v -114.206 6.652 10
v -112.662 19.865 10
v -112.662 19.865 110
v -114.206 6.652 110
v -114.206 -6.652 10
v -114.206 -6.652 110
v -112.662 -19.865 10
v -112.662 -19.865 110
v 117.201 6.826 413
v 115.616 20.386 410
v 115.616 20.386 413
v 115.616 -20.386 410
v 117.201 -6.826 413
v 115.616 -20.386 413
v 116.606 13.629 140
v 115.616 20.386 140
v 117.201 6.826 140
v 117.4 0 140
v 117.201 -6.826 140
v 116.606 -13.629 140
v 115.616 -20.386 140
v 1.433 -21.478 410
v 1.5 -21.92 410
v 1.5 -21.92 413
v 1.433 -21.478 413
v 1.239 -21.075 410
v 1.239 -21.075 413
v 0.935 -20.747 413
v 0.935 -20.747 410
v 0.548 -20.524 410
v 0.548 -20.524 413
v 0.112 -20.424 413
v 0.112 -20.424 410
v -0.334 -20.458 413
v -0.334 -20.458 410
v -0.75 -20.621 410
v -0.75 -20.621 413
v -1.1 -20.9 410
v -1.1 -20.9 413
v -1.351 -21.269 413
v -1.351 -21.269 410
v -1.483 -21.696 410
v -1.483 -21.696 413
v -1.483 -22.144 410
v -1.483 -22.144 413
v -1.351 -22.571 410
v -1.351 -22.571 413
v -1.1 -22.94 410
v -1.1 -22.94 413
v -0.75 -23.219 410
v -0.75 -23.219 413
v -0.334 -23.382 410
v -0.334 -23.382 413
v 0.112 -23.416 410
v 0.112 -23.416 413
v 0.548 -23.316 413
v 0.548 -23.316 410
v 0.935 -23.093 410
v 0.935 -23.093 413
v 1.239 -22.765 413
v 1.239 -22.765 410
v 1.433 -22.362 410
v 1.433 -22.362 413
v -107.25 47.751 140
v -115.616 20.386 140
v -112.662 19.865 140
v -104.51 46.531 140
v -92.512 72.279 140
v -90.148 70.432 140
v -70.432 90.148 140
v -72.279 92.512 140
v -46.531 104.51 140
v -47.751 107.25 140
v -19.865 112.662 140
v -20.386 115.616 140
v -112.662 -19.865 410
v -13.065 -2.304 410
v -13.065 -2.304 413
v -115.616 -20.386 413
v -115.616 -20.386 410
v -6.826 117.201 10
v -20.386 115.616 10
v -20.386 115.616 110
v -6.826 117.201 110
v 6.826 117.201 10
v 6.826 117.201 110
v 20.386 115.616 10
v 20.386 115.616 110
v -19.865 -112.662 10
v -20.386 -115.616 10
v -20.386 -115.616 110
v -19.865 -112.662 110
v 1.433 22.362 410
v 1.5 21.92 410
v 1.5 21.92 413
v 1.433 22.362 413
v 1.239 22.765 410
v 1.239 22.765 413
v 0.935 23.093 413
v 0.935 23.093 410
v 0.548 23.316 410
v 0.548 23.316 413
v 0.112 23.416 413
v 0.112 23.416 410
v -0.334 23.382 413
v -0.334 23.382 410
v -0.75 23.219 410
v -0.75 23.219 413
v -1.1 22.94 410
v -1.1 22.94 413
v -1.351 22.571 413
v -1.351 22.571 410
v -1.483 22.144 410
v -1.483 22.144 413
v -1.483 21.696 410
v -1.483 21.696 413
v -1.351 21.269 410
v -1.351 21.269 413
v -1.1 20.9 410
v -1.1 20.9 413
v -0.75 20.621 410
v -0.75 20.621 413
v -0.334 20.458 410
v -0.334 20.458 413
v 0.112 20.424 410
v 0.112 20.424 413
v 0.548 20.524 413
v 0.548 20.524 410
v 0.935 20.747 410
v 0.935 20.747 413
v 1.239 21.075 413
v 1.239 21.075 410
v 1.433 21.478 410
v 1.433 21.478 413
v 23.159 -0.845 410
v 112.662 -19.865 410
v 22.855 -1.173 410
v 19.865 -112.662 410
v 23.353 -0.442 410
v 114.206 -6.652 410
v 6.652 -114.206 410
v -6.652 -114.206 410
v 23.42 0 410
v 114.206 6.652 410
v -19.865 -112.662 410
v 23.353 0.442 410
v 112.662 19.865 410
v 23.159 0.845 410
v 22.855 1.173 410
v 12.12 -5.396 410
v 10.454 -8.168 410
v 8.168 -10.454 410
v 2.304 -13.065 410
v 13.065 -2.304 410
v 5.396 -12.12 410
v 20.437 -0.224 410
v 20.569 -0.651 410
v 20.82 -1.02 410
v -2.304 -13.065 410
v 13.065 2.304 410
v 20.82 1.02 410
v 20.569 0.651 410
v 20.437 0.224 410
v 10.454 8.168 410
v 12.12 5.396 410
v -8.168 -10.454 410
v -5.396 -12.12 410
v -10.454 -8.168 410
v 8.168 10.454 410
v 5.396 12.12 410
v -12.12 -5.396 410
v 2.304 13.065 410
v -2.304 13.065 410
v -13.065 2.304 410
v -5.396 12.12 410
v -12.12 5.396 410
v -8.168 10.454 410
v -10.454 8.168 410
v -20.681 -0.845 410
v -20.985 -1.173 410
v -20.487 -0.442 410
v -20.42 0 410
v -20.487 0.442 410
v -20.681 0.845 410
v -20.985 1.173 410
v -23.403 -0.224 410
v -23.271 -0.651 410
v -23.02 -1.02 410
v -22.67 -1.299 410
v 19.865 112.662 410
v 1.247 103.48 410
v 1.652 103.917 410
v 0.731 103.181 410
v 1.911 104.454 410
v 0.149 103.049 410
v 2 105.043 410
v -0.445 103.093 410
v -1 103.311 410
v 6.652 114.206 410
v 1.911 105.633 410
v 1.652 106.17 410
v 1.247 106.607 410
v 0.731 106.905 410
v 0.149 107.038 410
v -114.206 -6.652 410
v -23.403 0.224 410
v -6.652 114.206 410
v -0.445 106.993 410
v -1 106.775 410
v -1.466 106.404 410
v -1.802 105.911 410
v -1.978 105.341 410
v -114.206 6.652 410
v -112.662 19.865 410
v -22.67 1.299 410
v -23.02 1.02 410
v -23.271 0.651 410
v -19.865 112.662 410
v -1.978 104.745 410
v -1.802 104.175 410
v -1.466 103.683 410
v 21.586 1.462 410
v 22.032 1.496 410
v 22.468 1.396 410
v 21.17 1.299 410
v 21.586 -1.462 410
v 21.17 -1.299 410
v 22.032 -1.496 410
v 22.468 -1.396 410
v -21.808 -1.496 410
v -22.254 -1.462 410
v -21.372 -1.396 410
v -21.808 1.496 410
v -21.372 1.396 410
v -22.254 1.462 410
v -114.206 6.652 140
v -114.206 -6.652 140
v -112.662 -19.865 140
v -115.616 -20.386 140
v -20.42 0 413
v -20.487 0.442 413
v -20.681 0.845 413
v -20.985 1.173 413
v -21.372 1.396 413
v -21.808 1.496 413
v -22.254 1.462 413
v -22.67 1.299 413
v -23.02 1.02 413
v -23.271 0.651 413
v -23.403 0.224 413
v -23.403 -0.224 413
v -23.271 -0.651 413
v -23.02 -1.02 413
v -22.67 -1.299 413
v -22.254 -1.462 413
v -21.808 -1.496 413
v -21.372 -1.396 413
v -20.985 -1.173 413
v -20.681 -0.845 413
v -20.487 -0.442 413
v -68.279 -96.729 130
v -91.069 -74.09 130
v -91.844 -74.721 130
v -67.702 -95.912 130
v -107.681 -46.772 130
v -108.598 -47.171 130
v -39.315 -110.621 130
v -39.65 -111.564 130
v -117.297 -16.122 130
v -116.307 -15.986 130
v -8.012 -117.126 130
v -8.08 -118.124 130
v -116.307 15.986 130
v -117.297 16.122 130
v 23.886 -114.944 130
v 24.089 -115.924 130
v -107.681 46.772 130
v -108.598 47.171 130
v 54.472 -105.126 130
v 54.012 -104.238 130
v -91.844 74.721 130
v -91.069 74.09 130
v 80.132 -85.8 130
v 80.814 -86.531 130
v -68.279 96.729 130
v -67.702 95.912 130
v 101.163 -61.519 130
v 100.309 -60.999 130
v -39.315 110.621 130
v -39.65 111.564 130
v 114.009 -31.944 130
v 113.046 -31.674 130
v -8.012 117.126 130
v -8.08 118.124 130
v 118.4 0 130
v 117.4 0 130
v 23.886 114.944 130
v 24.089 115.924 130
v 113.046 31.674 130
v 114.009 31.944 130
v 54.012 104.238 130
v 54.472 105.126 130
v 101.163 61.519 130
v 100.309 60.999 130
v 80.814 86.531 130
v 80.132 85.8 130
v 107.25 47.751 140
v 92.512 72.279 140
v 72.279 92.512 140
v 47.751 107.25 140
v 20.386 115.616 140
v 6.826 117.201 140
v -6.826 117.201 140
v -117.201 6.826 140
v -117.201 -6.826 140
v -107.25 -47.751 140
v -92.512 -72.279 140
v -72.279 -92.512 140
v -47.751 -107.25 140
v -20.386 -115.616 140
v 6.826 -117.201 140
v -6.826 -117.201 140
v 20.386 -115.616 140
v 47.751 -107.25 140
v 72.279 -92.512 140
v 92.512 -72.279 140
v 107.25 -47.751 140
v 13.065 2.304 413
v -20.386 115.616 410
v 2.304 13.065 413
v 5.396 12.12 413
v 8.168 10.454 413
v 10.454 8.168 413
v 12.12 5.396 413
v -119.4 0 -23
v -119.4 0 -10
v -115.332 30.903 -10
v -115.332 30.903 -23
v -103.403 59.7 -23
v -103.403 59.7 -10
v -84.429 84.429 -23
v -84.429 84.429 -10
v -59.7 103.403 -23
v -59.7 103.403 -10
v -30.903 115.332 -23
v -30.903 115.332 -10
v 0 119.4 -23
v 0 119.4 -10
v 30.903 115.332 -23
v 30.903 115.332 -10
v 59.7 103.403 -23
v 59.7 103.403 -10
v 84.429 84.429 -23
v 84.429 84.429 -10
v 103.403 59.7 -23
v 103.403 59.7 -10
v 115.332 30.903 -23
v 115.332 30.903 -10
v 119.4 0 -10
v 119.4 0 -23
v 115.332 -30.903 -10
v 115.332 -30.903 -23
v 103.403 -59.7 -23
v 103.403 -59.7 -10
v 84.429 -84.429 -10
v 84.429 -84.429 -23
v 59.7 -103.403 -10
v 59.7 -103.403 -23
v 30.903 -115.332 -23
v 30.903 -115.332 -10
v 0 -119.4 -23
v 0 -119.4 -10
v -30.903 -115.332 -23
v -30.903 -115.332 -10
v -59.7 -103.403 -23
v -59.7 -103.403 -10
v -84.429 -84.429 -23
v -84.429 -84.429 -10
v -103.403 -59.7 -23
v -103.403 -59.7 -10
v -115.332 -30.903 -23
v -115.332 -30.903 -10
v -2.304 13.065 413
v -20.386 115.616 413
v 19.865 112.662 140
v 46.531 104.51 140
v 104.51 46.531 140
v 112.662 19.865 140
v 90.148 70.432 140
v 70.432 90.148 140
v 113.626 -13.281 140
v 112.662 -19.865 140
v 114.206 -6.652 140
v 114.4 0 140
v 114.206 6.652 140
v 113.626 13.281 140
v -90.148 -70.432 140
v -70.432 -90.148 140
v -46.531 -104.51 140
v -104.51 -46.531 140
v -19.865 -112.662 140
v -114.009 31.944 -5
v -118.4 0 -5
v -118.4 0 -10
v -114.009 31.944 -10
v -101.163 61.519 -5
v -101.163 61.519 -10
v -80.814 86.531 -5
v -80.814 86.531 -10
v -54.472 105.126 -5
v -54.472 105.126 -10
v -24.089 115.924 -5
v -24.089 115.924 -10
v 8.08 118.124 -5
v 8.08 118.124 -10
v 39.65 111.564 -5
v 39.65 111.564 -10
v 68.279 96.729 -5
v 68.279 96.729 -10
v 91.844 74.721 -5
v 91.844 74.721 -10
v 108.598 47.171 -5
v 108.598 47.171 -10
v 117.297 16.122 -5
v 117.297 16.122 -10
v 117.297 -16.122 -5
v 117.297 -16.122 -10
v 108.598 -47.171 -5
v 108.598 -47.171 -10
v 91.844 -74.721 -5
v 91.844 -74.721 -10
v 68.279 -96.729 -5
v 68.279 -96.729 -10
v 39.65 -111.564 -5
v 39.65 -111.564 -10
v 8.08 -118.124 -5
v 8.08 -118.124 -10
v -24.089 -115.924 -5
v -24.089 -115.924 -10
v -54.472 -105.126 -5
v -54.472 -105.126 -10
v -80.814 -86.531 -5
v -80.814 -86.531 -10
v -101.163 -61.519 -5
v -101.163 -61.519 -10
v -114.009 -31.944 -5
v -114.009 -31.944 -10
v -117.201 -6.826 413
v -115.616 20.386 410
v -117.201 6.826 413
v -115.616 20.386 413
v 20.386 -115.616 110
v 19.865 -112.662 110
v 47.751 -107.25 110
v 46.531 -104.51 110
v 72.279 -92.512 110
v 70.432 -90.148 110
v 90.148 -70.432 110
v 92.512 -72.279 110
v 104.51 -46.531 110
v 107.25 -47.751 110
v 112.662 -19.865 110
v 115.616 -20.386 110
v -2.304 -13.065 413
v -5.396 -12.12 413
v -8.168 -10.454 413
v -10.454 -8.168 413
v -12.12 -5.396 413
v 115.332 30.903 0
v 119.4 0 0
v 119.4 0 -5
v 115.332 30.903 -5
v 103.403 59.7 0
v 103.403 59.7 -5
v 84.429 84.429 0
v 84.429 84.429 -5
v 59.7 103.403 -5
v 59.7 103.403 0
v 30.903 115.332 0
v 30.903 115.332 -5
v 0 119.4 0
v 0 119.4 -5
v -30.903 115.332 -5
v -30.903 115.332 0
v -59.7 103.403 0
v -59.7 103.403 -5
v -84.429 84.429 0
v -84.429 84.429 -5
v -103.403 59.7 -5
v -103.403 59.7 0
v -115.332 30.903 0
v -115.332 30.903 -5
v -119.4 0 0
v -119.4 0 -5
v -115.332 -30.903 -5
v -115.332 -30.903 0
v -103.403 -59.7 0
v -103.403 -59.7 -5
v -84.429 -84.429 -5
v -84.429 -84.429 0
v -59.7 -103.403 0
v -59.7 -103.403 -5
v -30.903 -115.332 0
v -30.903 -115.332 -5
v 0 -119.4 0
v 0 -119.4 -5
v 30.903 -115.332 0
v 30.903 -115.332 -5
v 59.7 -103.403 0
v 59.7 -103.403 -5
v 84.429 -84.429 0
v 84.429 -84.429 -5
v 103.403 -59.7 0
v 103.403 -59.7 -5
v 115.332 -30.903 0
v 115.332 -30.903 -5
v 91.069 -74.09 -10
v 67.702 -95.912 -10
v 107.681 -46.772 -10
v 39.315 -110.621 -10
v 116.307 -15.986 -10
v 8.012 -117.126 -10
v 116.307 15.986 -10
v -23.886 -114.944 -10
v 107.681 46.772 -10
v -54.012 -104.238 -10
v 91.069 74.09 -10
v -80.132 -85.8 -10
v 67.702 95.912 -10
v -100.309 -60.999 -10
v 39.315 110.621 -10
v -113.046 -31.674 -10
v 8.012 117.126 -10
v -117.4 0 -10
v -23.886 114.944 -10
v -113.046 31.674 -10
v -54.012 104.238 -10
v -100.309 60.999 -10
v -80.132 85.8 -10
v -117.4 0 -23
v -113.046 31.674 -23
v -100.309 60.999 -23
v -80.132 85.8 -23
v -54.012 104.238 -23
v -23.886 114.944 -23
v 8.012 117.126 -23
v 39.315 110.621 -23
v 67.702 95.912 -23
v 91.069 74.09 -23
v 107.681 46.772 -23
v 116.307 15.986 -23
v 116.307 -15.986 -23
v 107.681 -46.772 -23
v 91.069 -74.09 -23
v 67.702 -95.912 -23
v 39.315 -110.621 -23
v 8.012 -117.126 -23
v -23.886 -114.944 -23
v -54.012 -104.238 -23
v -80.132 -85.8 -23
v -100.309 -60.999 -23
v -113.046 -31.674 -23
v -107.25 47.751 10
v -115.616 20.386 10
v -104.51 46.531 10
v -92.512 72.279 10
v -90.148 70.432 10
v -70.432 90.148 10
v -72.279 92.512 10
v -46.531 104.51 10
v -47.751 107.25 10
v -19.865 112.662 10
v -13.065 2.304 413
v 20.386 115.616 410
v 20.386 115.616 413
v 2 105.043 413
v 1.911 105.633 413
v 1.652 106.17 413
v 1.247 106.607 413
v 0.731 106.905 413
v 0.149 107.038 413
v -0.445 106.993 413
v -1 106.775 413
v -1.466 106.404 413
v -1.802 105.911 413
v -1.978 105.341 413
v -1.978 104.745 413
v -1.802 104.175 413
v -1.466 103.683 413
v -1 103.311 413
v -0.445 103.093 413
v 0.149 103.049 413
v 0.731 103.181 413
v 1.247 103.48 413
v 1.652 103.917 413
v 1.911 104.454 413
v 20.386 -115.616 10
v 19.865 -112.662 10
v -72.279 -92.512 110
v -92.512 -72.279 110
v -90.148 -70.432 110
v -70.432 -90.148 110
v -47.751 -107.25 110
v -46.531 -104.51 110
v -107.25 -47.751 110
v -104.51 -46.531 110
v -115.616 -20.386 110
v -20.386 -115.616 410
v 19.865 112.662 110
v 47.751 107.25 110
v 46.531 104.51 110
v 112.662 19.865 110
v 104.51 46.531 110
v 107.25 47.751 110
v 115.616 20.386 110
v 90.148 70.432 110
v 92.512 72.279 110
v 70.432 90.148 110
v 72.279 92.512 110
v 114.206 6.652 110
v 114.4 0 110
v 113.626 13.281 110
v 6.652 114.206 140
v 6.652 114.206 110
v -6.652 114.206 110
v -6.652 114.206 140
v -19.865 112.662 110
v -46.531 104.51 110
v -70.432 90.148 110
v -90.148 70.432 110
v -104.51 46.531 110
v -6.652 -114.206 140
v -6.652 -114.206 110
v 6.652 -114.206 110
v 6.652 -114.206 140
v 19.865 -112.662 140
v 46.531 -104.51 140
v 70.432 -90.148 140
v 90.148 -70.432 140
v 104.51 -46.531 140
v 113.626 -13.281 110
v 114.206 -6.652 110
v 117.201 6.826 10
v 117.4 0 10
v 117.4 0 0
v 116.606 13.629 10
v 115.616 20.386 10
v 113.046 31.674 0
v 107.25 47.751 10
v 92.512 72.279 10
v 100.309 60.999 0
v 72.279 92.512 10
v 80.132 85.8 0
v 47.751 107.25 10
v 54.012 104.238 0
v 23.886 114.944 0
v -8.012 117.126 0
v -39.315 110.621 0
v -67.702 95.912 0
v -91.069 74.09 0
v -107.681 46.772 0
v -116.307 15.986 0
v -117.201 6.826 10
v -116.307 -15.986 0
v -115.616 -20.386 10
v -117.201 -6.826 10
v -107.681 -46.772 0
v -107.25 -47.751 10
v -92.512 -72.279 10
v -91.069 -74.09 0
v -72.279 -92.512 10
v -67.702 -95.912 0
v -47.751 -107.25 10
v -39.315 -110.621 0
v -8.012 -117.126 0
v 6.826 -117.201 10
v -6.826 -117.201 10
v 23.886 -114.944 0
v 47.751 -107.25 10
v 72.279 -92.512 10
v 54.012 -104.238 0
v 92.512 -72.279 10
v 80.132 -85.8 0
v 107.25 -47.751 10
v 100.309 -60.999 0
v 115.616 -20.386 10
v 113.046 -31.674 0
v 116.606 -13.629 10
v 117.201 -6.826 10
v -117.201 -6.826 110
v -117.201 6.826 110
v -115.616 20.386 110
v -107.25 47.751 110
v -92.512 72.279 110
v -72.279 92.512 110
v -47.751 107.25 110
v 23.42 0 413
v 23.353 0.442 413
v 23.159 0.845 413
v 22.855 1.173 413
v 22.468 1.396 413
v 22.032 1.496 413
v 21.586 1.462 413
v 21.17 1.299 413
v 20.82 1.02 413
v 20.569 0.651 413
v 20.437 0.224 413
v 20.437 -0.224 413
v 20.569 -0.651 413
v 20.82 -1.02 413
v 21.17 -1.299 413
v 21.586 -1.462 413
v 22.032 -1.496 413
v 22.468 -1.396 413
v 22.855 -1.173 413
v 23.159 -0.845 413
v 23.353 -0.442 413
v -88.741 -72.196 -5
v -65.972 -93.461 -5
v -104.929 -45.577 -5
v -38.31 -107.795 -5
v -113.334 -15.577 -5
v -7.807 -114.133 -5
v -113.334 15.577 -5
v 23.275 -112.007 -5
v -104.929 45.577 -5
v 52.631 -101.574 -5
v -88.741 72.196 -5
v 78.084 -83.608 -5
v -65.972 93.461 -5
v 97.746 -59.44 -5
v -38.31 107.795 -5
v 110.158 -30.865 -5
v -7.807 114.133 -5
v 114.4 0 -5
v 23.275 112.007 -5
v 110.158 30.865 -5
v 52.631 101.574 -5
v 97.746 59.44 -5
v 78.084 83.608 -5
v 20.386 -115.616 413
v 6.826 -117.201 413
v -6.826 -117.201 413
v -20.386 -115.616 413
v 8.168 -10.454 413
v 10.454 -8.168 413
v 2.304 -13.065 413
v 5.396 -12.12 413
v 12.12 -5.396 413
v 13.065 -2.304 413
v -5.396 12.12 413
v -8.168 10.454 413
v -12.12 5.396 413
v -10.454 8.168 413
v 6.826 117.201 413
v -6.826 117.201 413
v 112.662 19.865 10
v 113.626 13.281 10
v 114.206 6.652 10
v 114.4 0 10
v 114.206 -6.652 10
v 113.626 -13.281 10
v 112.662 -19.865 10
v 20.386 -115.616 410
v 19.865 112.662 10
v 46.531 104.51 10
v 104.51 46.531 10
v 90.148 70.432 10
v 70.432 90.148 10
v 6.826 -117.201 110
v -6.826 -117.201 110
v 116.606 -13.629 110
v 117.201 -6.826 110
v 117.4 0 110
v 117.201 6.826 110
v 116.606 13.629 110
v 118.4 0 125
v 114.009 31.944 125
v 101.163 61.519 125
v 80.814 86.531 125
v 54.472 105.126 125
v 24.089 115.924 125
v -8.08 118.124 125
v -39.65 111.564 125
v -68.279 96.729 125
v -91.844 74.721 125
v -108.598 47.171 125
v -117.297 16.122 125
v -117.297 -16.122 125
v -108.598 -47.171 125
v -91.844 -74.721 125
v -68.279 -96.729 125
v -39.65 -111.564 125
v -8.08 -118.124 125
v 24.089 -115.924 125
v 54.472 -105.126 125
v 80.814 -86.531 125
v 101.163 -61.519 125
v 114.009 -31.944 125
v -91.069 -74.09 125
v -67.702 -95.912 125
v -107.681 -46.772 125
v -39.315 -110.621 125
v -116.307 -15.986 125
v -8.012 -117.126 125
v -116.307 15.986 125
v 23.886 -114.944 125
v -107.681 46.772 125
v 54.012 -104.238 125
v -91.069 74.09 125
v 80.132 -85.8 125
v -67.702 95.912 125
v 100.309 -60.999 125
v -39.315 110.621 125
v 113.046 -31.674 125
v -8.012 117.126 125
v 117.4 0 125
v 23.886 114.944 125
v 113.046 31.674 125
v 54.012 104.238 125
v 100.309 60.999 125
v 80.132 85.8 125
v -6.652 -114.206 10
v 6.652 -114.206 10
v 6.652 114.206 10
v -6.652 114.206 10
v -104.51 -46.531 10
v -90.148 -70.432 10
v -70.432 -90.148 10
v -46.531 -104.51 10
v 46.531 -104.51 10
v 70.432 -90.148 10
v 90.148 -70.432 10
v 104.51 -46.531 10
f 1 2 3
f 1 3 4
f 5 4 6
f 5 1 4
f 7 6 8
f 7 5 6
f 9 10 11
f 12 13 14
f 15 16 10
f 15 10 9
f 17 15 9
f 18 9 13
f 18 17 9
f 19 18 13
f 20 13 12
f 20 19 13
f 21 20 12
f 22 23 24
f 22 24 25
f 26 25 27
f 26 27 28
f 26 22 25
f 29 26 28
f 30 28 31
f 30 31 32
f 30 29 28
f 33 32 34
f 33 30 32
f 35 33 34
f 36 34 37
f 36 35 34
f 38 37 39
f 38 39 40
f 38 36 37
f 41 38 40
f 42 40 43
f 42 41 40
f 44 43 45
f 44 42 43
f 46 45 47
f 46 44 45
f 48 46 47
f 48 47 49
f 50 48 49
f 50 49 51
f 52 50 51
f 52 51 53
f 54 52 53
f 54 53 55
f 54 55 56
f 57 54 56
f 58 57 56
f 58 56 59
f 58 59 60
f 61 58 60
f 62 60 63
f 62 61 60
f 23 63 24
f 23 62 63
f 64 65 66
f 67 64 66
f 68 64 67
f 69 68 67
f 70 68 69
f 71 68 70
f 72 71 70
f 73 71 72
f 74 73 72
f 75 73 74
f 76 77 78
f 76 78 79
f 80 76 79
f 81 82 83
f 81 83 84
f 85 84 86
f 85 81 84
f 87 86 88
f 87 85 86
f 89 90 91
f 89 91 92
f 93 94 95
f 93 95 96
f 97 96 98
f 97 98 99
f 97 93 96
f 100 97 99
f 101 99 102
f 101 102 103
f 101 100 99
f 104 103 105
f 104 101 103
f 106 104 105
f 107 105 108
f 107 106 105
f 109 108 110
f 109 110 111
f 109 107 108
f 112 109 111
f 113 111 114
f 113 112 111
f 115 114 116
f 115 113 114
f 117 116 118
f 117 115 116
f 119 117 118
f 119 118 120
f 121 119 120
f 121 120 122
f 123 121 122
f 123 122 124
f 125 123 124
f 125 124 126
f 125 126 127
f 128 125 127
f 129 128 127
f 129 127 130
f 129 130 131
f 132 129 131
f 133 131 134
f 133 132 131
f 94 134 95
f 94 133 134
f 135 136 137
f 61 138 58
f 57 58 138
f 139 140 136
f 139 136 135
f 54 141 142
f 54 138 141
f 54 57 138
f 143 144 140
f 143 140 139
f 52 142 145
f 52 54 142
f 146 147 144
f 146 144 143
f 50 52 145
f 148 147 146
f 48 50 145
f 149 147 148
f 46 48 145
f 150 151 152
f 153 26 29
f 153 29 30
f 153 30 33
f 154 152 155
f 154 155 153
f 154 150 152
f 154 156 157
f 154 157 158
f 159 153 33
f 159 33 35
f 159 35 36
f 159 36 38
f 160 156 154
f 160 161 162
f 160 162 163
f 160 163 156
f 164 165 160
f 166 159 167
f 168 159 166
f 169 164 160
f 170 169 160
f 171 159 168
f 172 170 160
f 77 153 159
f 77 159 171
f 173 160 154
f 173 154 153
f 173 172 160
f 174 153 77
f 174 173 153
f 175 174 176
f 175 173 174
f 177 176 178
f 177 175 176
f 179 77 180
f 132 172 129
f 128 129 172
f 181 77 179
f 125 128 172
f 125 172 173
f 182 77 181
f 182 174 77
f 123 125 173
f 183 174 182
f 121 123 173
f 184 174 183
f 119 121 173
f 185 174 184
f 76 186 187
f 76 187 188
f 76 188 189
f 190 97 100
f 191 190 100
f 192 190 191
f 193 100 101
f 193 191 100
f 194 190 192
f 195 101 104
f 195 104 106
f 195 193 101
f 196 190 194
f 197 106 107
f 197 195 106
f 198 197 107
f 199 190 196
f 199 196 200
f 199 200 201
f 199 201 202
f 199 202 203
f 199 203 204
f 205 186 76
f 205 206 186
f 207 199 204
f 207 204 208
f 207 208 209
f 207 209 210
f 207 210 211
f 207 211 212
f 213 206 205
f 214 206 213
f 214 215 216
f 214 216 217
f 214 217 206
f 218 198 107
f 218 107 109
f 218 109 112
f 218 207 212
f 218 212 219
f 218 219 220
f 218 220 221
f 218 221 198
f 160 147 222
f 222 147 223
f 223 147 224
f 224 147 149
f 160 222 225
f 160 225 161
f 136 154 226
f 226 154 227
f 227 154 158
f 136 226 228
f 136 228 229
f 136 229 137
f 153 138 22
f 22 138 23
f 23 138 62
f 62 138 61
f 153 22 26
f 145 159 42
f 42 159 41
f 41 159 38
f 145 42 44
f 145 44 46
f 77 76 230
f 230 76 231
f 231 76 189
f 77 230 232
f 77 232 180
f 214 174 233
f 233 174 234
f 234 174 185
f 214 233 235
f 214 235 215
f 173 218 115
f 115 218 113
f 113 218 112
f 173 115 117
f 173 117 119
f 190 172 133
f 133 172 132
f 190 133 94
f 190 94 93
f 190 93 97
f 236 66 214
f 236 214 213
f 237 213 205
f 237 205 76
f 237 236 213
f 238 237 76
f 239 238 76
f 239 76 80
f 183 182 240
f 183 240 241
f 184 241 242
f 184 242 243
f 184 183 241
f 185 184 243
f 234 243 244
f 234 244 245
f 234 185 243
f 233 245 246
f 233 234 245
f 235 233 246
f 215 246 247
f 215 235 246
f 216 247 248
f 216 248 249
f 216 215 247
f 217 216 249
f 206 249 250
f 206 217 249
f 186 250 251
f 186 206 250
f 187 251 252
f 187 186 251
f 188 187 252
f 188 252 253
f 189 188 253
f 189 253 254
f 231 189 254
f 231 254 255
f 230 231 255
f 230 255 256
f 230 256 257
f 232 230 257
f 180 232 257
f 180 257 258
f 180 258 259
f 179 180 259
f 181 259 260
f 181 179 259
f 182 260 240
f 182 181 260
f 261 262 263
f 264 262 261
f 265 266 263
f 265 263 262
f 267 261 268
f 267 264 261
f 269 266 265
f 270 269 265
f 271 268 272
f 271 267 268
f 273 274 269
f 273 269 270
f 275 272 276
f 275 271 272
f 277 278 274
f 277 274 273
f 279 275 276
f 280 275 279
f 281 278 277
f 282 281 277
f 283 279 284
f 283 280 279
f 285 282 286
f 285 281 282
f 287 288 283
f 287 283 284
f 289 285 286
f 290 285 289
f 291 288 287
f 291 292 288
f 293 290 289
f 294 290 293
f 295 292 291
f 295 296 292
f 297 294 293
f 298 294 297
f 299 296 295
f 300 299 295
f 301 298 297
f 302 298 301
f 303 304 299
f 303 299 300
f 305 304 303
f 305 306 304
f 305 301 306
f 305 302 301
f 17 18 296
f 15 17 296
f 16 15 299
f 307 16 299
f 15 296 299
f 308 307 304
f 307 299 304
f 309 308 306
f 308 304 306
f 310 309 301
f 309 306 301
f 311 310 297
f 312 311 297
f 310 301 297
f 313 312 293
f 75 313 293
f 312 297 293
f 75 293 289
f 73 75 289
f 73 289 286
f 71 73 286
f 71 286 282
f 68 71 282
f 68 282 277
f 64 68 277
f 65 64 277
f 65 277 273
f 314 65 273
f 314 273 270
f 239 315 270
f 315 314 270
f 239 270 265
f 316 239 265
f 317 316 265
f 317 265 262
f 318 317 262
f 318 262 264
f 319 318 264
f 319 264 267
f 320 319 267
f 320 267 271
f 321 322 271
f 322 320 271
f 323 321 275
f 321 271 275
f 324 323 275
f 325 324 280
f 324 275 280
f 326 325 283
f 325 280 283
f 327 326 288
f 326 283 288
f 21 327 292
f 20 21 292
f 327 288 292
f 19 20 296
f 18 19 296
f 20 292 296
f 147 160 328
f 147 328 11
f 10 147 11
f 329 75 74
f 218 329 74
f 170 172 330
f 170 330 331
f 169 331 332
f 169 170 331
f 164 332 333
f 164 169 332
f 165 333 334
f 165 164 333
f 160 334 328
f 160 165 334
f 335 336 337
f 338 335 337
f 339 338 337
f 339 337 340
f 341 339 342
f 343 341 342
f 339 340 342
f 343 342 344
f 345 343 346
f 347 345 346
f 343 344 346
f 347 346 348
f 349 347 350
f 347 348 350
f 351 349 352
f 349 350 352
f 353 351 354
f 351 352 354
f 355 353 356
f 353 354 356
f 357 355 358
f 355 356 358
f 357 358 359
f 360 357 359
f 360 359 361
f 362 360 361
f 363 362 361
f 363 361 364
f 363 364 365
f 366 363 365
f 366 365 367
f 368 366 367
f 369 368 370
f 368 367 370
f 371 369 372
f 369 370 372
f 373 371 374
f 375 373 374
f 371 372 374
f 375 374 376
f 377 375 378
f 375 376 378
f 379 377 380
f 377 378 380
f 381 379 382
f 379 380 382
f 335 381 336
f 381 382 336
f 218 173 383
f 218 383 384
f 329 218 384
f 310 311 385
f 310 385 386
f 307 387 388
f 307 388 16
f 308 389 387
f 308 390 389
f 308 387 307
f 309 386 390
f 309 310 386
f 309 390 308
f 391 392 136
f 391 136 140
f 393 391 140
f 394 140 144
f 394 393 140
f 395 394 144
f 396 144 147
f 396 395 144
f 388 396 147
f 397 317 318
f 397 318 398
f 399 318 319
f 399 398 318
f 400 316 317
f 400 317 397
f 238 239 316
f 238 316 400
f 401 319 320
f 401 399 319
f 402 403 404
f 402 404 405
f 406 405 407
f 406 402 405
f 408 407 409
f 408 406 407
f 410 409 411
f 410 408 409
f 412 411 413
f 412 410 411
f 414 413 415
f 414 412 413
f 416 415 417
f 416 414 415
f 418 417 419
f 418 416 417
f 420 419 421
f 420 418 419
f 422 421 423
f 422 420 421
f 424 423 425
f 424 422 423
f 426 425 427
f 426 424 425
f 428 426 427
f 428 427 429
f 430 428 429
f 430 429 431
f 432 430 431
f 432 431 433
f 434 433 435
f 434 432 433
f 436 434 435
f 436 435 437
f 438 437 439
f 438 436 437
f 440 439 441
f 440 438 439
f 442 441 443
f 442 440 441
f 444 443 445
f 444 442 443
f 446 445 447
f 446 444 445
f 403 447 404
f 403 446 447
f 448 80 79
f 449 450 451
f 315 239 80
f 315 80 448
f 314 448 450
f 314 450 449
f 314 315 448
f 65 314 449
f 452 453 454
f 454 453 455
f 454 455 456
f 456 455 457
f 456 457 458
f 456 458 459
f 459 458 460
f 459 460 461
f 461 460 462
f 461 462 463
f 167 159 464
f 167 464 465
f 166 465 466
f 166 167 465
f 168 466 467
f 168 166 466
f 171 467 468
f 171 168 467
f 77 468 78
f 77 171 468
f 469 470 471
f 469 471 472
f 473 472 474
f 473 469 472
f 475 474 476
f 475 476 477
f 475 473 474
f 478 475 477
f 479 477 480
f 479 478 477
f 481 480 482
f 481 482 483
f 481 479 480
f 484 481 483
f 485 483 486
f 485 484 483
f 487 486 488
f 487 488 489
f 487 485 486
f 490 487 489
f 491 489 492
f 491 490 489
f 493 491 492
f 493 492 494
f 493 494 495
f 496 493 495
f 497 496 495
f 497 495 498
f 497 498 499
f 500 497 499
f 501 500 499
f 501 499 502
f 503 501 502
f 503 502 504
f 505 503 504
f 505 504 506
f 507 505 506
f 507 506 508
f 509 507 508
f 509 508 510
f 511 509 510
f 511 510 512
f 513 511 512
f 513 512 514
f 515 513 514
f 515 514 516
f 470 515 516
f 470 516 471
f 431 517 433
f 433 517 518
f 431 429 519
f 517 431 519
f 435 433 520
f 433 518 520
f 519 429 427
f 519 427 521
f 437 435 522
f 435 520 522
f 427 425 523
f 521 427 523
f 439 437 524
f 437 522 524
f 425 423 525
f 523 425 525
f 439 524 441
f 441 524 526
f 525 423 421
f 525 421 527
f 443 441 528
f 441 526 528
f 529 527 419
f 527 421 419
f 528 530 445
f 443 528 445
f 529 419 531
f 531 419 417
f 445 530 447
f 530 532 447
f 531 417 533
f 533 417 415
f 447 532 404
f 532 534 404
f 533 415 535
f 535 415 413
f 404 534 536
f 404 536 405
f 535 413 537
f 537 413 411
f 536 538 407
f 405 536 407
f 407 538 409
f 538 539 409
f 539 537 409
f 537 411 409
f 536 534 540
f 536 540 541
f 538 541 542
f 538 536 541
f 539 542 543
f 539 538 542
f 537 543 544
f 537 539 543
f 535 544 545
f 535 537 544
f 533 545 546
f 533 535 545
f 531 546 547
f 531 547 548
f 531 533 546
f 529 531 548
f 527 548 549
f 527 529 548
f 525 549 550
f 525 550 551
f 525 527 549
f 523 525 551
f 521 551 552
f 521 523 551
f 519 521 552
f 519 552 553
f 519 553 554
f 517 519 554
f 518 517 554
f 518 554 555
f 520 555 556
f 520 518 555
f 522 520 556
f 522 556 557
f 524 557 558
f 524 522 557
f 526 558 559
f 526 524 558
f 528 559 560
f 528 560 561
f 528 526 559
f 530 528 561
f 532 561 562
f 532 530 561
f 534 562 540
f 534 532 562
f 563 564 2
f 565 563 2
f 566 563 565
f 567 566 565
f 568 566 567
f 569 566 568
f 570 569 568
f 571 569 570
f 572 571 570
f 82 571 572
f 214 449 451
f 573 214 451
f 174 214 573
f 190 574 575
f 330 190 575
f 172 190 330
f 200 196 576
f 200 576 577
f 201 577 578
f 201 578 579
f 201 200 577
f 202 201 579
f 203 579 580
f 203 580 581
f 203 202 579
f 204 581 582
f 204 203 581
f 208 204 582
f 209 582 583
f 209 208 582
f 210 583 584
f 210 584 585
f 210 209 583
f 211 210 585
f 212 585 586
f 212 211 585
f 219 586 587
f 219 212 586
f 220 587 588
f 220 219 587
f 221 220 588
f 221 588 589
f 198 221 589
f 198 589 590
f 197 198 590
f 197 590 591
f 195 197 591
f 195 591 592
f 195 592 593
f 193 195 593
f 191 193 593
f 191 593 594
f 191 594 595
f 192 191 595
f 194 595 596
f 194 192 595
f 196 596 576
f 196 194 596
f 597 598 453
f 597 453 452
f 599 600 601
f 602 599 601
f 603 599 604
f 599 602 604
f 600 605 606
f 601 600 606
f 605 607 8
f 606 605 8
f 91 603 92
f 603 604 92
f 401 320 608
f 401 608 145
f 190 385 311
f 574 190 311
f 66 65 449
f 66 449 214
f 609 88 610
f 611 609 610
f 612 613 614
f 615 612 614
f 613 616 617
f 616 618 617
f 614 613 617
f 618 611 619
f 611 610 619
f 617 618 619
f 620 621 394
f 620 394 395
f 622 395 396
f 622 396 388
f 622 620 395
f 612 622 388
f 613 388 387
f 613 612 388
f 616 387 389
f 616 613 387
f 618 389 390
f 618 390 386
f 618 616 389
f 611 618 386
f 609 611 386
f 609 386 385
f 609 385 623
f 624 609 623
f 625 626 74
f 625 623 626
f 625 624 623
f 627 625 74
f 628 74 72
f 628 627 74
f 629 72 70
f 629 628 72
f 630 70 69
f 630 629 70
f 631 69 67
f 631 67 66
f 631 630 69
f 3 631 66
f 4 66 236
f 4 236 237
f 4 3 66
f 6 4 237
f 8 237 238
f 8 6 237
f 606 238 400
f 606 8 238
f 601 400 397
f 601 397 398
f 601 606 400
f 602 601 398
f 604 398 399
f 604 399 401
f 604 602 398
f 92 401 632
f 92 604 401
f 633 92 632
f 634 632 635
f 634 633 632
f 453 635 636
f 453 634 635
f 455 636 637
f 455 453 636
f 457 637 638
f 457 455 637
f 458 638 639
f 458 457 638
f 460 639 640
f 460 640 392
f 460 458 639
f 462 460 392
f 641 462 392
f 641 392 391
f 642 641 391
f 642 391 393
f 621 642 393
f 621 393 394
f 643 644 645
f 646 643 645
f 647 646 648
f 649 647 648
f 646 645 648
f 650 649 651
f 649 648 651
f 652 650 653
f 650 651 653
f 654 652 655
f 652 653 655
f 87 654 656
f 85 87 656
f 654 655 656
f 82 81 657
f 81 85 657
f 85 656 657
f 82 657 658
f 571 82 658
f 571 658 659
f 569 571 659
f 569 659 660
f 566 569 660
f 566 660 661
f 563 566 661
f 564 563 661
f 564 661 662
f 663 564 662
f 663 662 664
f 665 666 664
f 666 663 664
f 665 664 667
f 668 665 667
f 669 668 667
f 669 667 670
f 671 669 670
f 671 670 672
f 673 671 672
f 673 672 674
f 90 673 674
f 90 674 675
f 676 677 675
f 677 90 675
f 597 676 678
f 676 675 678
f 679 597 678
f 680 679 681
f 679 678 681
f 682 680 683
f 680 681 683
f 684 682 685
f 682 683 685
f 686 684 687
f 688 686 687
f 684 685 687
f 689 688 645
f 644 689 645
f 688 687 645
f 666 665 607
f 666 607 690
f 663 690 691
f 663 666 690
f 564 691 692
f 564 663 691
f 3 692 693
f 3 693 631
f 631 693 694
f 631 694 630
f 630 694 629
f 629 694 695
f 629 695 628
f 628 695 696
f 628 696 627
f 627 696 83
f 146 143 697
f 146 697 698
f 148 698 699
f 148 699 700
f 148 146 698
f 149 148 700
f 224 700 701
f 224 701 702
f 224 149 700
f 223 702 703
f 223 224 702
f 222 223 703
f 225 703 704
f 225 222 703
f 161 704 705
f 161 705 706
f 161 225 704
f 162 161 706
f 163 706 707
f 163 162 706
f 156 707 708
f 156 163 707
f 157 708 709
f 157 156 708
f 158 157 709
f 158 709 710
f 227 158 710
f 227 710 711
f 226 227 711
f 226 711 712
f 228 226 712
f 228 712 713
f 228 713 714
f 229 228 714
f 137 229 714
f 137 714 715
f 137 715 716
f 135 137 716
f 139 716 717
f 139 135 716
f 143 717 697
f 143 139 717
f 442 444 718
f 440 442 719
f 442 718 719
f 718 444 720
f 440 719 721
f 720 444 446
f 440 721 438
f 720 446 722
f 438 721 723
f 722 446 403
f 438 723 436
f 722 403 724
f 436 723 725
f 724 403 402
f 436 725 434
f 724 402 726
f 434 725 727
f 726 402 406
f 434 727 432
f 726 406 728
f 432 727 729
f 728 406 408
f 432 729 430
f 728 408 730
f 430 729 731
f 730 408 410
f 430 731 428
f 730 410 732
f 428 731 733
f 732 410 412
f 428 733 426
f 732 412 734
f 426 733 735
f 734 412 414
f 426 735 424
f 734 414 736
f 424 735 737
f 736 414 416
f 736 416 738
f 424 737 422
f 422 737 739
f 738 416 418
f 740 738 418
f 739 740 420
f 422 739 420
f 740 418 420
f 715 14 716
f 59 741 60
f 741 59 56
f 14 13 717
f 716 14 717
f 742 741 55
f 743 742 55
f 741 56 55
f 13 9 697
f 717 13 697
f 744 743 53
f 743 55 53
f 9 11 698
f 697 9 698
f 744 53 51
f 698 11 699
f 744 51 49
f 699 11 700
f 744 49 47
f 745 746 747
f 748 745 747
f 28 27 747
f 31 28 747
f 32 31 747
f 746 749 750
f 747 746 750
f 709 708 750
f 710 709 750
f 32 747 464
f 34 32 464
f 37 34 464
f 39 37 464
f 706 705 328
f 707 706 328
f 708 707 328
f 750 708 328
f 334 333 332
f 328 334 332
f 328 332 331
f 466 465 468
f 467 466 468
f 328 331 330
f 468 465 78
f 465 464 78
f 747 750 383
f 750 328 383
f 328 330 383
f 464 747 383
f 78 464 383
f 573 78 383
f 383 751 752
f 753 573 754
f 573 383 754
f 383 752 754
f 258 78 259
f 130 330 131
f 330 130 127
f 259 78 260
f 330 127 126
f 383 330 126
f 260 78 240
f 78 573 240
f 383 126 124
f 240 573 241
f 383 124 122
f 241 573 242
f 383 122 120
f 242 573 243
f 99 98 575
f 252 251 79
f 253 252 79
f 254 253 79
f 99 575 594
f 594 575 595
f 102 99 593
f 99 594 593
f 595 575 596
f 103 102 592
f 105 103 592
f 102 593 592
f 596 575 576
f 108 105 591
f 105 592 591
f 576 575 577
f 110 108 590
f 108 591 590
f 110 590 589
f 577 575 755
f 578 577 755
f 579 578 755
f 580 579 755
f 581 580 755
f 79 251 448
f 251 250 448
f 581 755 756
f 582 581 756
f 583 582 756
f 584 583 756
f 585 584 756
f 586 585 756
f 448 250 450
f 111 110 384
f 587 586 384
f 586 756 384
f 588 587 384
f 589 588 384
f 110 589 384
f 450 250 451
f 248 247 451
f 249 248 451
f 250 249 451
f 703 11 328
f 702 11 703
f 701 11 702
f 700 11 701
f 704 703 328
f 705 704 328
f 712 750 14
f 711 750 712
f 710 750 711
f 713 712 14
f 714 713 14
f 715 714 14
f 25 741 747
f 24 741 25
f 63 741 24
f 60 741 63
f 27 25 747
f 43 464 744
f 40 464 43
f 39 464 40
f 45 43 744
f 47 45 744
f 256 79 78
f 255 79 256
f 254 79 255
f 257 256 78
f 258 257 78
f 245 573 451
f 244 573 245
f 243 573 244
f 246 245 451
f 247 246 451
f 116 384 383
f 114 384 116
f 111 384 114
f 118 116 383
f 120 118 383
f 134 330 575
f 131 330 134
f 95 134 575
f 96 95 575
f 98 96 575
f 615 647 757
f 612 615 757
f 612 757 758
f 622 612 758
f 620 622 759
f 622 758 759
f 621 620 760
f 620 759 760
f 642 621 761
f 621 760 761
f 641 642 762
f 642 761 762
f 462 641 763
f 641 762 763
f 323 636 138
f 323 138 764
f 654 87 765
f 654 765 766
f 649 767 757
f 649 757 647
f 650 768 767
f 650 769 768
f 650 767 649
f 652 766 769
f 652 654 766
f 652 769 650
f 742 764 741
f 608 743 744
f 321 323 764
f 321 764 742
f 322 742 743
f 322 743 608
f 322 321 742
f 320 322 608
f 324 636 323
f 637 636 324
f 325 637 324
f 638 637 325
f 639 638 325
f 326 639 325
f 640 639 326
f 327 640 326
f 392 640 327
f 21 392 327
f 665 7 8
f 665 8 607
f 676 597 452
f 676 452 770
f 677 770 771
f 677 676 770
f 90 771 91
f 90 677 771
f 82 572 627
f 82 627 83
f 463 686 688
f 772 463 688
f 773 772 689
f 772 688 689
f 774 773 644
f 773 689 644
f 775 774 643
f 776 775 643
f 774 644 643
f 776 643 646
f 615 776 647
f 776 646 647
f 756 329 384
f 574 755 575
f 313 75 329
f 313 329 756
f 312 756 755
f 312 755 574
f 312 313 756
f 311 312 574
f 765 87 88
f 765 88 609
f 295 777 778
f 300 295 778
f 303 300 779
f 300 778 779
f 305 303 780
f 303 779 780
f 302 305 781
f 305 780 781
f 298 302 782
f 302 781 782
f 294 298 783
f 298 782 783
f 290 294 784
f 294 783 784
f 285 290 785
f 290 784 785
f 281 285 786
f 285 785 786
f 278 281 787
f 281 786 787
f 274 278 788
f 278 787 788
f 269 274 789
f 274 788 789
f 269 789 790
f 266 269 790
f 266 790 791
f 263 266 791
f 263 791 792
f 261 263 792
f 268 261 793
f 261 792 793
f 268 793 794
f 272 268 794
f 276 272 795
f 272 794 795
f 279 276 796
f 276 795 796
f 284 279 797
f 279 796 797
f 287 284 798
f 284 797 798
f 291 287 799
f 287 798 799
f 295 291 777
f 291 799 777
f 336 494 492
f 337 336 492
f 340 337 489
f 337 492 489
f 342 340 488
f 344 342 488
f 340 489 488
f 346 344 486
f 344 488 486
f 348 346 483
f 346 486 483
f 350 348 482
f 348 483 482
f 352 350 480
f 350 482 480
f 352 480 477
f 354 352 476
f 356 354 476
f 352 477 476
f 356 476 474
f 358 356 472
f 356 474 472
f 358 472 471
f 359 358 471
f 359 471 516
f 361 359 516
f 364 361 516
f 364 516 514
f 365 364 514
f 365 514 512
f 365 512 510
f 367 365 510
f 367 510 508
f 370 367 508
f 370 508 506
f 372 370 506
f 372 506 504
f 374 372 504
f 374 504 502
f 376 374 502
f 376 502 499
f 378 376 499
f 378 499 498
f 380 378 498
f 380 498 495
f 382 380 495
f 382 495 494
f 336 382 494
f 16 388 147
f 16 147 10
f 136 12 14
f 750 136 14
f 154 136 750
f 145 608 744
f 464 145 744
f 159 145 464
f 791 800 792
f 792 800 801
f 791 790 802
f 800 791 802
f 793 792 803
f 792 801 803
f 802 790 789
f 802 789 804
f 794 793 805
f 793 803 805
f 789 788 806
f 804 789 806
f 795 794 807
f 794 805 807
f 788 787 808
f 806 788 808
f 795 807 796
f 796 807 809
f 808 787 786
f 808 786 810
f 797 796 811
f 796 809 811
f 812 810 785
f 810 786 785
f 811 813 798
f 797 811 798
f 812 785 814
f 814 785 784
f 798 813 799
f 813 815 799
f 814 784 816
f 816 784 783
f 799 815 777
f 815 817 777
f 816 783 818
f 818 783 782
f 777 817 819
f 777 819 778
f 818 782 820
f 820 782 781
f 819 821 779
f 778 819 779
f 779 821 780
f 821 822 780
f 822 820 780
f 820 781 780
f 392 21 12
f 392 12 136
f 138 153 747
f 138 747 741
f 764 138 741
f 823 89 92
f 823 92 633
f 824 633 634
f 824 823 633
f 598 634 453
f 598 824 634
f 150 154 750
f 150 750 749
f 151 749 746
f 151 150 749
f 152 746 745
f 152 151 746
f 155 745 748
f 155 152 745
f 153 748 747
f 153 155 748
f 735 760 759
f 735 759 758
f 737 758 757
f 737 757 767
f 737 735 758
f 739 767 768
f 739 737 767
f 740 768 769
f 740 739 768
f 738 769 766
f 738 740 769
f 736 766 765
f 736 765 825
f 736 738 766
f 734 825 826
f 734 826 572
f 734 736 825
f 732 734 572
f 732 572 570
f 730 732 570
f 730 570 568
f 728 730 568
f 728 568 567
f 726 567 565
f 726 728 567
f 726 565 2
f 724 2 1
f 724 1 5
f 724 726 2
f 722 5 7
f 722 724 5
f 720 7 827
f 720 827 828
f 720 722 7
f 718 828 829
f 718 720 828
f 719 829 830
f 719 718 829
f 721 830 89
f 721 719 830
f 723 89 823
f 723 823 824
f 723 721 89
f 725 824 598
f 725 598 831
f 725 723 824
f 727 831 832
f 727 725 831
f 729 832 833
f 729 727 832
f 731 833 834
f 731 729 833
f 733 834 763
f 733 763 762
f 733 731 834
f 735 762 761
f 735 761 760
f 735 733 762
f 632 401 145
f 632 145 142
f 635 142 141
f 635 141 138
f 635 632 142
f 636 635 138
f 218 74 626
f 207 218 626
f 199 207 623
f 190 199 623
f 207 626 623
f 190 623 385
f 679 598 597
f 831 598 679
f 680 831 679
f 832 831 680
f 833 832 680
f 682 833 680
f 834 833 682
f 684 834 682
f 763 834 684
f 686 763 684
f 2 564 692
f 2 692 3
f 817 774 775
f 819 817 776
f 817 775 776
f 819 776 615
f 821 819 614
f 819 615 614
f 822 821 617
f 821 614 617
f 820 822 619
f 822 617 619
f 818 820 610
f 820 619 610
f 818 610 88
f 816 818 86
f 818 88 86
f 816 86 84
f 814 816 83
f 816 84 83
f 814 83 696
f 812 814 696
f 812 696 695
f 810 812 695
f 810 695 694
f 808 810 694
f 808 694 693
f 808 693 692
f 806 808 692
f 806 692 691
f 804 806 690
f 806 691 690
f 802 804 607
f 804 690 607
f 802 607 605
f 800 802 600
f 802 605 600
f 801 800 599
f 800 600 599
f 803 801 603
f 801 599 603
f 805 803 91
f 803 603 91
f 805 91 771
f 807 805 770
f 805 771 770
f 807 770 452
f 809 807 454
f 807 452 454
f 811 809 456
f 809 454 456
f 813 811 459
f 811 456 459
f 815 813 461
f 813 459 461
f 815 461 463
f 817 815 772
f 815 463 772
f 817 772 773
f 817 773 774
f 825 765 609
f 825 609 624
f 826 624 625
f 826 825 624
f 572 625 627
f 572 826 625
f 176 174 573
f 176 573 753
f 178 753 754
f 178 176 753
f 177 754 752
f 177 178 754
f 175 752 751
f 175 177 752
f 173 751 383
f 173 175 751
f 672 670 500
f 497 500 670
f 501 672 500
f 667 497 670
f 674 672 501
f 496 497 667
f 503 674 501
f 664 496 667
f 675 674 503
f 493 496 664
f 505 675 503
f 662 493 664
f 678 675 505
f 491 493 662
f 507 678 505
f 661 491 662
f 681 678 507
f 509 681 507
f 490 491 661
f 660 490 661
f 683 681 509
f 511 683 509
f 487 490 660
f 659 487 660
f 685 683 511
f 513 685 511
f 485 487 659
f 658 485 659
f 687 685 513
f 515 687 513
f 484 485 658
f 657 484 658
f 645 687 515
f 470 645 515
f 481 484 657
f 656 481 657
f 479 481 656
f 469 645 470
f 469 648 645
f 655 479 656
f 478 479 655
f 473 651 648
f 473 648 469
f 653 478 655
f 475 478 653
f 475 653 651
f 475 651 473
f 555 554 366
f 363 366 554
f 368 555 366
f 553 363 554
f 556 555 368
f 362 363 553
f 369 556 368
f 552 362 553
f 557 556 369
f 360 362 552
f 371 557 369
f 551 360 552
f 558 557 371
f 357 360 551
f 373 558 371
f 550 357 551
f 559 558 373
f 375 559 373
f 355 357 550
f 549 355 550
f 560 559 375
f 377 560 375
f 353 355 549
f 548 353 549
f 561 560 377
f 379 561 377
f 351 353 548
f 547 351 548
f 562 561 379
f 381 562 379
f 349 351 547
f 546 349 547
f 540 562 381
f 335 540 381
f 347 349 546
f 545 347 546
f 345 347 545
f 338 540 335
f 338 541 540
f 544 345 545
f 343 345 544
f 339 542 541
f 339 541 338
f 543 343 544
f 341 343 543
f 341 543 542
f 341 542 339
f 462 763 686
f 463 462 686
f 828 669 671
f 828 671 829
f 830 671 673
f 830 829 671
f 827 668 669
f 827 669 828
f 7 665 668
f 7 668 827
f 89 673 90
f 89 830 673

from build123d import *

# Parameters (mm, degrees)
SKETCH1_R       = 119.4
SKETCH1_R_2     = 114.4
EXTRUDE1_DEPTH  = 5
SKETCH2_R       = 119.4
SKETCH2_R_2     = 118.4
EXTRUDE2_DEPTH  = 5
SKETCH3_R       = 119.4
SKETCH3_R_2     = 117.4
EXTRUDE3_DEPTH  = 13
SKETCH4_R       = 117.4
SKETCH4_R_2     = 114.4
EXTRUDE4_DEPTH  = 10
EXTRUDE5_DEPTH  = 100
SKETCH6_R       = 117.4
SKETCH6_R_2     = 114.4
EXTRUDE7_DEPTH  = 15
SKETCH7_R       = 118.4
SKETCH7_R_2     = 114.4
EXTRUDE8_DEPTH  = 5
SKETCH8_R       = 117.4
SKETCH8_R_2     = 114.4
EXTRUDE9_DEPTH  = 10
EXTRUDE10_DEPTH = 270
SKETCH10_R      = 1.5
SKETCH10_R_2    = 2
EXTRUDE11_DEPTH = 3


with BuildPart() as part:
    # Sketch1 → Extrude1 (new body)
    with BuildSketch(Plane.XY):
        Circle(SKETCH1_R)
        Circle(SKETCH1_R_2, mode=Mode.SUBTRACT)
    extrude(amount=-EXTRUDE1_DEPTH)

    # Sketch2 → Extrude2 (add)
    with BuildSketch(Plane(origin=(0, 0, -5), x_dir=(-1, 0, 0), z_dir=(0, 0, -1))):
        Circle(SKETCH2_R)
        Circle(SKETCH2_R_2, mode=Mode.SUBTRACT)
    extrude(amount=EXTRUDE2_DEPTH)

    # Sketch3 → Extrude3 (add)
    with BuildSketch(Plane(origin=(0, 0, -10), x_dir=(-1, 0, 0), z_dir=(0, 0, -1))):
        Circle(SKETCH3_R)
        Circle(SKETCH3_R_2, mode=Mode.SUBTRACT)
    extrude(amount=EXTRUDE3_DEPTH)

    # Sketch4 → Extrude4 (add)
    with BuildSketch(Plane.XY):
        Circle(SKETCH4_R)
        Circle(SKETCH4_R_2, mode=Mode.SUBTRACT)
    extrude(amount=EXTRUDE4_DEPTH)

    # Sketch5 → Extrude5 (add)
    with BuildSketch(Plane.XY.offset(10)):
        with BuildLine():
            Line((20.386296, 115.61643), (19.865352, 112.662007))
            ThreePointArc((19.865352, 112.662007), (0, 114.4), (-19.865352, 112.662007))
            Line((-19.865352, 112.662007), (-20.386296, 115.61643))
            ThreePointArc((-20.386296, 115.61643), (0, 117.4), (20.386296, 115.61643))
        make_face()
        with BuildLine():
            Line((115.61643, 20.386296), (112.662007, 19.865352))
            ThreePointArc((112.662007, 19.865352), (114.4, 0), (112.662007, -19.865352))
            Line((112.662007, -19.865352), (115.61643, -20.386296))
            ThreePointArc((115.61643, -20.386296), (117.4, 0), (115.61643, 20.386296))
        make_face()
        with BuildLine():
            Line((19.865352, -112.662007), (20.386296, -115.61643))
            ThreePointArc((20.386296, -115.61643), (0, -117.4), (-20.386296, -115.61643))
            Line((-20.386296, -115.61643), (-19.865352, -112.662007))
            ThreePointArc((-19.865352, -112.662007), (0, -114.4), (19.865352, -112.662007))
        make_face()
        with BuildLine():
            Line((-112.662007, -19.865352), (-115.61643, -20.386296))
            ThreePointArc((-115.61643, -20.386296), (-117.4, 0), (-115.61643, 20.386296))
            Line((-115.61643, 20.386296), (-112.662007, 19.865352))
            ThreePointArc((-112.662007, 19.865352), (-114.4, 0), (-112.662007, -19.865352))
        make_face()
    extrude(amount=EXTRUDE5_DEPTH)

    # Sketch6 → Extrude7 (add)
    with BuildSketch(Plane.XY.offset(110)):
        Circle(SKETCH6_R)
        Circle(SKETCH6_R_2, mode=Mode.SUBTRACT)
    extrude(amount=EXTRUDE7_DEPTH)

    # Sketch7 → Extrude8 (add)
    with BuildSketch(Plane.XY.offset(125)):
        Circle(SKETCH7_R)
        Circle(SKETCH7_R_2, mode=Mode.SUBTRACT)
    extrude(amount=EXTRUDE8_DEPTH)

    # Sketch8 → Extrude9 (add)
    with BuildSketch(Plane.XY.offset(130)):
        Circle(SKETCH8_R)
        Circle(SKETCH8_R_2, mode=Mode.SUBTRACT)
    extrude(amount=EXTRUDE9_DEPTH)

    # Sketch9 → Extrude10 (add)
    with BuildSketch(Plane.XY.offset(140)):
        with BuildLine():
            Line((-20.386296, 115.61643), (-19.865352, 112.662007))
            ThreePointArc((-19.865352, 112.662007), (0, 114.4), (19.865352, 112.662007))
            Line((19.865352, 112.662007), (20.386296, 115.61643))
            ThreePointArc((20.386296, 115.61643), (0, 117.4), (-20.386296, 115.61643))
        make_face()
        with BuildLine():
            Line((112.662007, 19.865352), (115.61643, 20.386296))
            ThreePointArc((115.61643, 20.386296), (117.4, 0), (115.61643, -20.386296))
            Line((115.61643, -20.386296), (112.662007, -19.865352))
            ThreePointArc((112.662007, -19.865352), (114.4, 0), (112.662007, 19.865352))
        make_face()
        with BuildLine():
            Line((19.865352, -112.662007), (20.386296, -115.61643))
            ThreePointArc((20.386296, -115.61643), (0, -117.4), (-20.386296, -115.61643))
            Line((-20.386296, -115.61643), (-19.865352, -112.662007))
            ThreePointArc((-19.865352, -112.662007), (0, -114.4), (19.865352, -112.662007))
        make_face()
        with BuildLine():
            Line((-112.662007, -19.865352), (-115.61643, -20.386296))
            ThreePointArc((-115.61643, -20.386296), (-117.4, 0), (-115.61643, 20.386296))
            Line((-115.61643, 20.386296), (-112.662007, 19.865352))
            ThreePointArc((-112.662007, 19.865352), (-114.4, 0), (-112.662007, -19.865352))
        make_face()
    extrude(amount=EXTRUDE10_DEPTH)

    # Sketch10 → Extrude11 (add)
    with BuildSketch(Plane.XY.offset(410)):
        with BuildLine():
            Line((13.065229, 2.303752), (115.61643, 20.386296))
            ThreePointArc((115.61643, 20.386296), (117.4, 0), (115.61643, -20.386296))
            Line((115.61643, -20.386296), (13.065229, -2.303752))
            ThreePointArc((13.065229, -2.303752), (9.381031, -9.381031), (2.303752, -13.065229))
            Line((2.303752, -13.065229), (20.386296, -115.61643))
            ThreePointArc((20.386296, -115.61643), (0, -117.4), (-20.386296, -115.61643))
            Line((-20.386296, -115.61643), (-2.303752, -13.065229))
            ThreePointArc((-2.303752, -13.065229), (-9.381031, -9.381031), (-13.065229, -2.303752))
            Line((-13.065229, -2.303752), (-115.61643, -20.386296))
            ThreePointArc((-115.61643, -20.386296), (-117.4, 0), (-115.61643, 20.386296))
            Line((-115.61643, 20.386296), (-13.065229, 2.303752))
            ThreePointArc((-13.065229, 2.303752), (-9.381031, 9.381031), (-2.303752, 13.065229))
            Line((-2.303752, 13.065229), (-20.386296, 115.61643))
            ThreePointArc((-20.386296, 115.61643), (0, 117.4), (20.386296, 115.61643))
            Line((20.386296, 115.61643), (2.303752, 13.065229))
            ThreePointArc((2.303752, 13.065229), (9.381031, 9.381031), (13.065229, 2.303752))
        make_face()
        with Locations((21.92, 0)):
            Circle(SKETCH10_R, mode=Mode.SUBTRACT)
        with Locations((0, -21.92)):
            Circle(SKETCH10_R, mode=Mode.SUBTRACT)
        with Locations((-21.92, 0)):
            Circle(SKETCH10_R, mode=Mode.SUBTRACT)
        with Locations((0, 21.92)):
            Circle(SKETCH10_R, mode=Mode.SUBTRACT)
        with Locations((0, 105.043168)):
            Circle(SKETCH10_R_2, mode=Mode.SUBTRACT)
    extrude(amount=EXTRUDE11_DEPTH)


solid = part.part
